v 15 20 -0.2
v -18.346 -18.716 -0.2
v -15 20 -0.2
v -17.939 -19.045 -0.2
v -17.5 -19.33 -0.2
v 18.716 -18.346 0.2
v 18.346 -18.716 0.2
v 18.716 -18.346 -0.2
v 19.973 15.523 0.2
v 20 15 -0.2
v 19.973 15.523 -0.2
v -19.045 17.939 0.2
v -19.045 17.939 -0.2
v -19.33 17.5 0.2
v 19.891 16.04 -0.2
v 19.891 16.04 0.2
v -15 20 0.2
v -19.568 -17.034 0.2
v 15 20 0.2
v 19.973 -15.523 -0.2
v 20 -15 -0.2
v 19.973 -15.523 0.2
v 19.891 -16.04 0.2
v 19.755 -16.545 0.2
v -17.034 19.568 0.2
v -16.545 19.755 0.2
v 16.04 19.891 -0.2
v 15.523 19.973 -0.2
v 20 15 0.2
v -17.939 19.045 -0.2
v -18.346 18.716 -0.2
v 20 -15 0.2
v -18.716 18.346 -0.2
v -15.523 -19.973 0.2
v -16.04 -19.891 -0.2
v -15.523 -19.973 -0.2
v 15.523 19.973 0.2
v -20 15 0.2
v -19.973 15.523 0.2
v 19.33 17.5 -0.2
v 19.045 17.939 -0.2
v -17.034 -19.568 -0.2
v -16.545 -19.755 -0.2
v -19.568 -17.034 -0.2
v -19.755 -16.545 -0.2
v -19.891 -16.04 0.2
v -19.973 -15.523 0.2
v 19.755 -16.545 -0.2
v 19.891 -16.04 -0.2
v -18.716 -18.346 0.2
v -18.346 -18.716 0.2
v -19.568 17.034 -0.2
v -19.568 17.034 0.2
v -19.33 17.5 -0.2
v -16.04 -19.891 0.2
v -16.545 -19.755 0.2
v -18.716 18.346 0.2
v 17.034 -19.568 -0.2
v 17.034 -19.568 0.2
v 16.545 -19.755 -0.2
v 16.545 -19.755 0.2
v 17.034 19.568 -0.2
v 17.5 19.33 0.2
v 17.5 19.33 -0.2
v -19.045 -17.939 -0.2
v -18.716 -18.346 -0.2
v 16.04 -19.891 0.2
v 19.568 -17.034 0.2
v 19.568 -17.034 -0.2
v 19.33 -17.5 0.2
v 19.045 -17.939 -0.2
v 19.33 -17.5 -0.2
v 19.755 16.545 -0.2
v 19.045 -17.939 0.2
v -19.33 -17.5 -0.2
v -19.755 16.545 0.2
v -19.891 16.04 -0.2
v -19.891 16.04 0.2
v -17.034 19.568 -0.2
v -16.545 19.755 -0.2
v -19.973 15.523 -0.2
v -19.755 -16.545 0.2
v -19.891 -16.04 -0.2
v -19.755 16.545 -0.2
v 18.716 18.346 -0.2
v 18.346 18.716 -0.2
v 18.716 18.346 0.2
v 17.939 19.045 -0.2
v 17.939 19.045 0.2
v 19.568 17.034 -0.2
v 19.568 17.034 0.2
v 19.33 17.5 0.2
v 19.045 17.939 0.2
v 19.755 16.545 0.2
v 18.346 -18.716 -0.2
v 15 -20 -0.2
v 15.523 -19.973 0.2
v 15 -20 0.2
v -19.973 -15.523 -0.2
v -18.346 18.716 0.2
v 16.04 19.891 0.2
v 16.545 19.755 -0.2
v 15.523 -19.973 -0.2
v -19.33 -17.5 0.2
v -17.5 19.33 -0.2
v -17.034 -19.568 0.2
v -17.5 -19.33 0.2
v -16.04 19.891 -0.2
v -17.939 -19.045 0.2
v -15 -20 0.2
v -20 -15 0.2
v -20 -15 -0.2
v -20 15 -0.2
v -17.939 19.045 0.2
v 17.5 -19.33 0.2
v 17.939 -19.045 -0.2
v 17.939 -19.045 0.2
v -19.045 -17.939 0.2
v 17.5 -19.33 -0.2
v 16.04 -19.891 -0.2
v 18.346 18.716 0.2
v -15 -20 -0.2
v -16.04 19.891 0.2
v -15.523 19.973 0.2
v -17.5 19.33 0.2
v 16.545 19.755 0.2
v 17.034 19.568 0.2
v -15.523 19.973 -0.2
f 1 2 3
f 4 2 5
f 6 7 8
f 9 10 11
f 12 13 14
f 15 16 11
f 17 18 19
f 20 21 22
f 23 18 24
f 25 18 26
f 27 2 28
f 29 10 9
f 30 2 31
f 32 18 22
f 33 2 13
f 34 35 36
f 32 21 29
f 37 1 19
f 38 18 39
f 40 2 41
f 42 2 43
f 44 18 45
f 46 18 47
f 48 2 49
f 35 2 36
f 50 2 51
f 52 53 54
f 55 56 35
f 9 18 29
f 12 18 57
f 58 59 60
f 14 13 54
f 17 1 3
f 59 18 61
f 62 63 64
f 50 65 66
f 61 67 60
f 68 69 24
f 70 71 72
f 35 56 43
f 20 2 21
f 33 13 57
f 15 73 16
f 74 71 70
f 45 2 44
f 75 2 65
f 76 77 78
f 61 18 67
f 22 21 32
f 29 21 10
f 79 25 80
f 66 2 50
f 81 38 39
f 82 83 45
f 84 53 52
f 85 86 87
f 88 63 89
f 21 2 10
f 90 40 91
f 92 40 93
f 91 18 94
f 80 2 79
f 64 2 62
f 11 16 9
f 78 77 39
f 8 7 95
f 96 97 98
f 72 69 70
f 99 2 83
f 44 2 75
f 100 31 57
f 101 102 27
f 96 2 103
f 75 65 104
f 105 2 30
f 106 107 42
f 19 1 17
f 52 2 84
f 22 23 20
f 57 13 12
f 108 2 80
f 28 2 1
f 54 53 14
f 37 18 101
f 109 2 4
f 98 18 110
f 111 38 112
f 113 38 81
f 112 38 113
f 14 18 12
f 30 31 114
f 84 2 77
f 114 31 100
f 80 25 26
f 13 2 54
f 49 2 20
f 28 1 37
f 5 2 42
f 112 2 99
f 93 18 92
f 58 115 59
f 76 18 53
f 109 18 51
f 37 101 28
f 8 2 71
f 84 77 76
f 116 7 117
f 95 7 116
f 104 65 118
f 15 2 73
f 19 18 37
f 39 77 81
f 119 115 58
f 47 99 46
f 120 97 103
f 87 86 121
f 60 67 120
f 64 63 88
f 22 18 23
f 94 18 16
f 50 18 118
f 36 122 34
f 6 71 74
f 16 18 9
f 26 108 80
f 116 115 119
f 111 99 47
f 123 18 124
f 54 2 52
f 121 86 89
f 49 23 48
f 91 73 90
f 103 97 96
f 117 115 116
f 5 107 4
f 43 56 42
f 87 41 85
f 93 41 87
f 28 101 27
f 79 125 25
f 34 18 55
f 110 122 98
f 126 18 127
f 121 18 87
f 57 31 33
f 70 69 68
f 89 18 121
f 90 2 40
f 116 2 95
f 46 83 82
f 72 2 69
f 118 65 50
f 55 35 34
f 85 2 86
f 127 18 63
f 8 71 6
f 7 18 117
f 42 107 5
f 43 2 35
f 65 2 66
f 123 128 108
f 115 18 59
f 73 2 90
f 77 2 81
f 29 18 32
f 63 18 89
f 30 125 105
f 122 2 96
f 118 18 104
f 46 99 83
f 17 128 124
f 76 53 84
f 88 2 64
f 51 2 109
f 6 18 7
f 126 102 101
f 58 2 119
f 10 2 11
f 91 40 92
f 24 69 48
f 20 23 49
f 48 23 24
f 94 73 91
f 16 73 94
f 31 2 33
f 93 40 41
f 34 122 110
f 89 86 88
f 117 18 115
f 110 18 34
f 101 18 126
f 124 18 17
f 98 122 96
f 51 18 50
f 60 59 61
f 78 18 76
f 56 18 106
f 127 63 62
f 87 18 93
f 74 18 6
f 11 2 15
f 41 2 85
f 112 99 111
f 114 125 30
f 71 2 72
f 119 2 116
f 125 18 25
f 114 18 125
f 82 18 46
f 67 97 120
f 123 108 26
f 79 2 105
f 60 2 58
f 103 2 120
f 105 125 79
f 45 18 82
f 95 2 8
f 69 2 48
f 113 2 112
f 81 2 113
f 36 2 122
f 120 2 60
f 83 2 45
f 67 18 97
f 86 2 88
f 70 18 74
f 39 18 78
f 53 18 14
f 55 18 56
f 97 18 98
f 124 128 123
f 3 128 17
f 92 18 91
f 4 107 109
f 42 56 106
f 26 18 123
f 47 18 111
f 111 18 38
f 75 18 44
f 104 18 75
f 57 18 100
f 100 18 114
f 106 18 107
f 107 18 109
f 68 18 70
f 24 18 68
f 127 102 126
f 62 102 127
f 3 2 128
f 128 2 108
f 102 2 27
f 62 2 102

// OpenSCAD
$fn=60;

plate4Point(40,40,.4,10);

////////////////////////////////////////////////////////////////////////////////////////////////////
module plate4Point(x,y,z,d){
	hull(){
		color("green") translate([(x/2)-(d/2) ,(y/2) -(d/2),0]) cylinder(h=z, d=d, center=true);
		color("blue")  translate([(x/2)-(d/2) ,-(y/2)+(d/2),0]) cylinder(h=z, d=d, center=true);
		color("red")   translate([-(x/2)+(d/2),(y/2) -(d/2),0]) cylinder(h=z, d=d, center=true);
		color("grey")  translate([-(x/2)+(d/2),-(y/2)+(d/2),0]) cylinder(h=z, d=d, center=true);
	}
}
